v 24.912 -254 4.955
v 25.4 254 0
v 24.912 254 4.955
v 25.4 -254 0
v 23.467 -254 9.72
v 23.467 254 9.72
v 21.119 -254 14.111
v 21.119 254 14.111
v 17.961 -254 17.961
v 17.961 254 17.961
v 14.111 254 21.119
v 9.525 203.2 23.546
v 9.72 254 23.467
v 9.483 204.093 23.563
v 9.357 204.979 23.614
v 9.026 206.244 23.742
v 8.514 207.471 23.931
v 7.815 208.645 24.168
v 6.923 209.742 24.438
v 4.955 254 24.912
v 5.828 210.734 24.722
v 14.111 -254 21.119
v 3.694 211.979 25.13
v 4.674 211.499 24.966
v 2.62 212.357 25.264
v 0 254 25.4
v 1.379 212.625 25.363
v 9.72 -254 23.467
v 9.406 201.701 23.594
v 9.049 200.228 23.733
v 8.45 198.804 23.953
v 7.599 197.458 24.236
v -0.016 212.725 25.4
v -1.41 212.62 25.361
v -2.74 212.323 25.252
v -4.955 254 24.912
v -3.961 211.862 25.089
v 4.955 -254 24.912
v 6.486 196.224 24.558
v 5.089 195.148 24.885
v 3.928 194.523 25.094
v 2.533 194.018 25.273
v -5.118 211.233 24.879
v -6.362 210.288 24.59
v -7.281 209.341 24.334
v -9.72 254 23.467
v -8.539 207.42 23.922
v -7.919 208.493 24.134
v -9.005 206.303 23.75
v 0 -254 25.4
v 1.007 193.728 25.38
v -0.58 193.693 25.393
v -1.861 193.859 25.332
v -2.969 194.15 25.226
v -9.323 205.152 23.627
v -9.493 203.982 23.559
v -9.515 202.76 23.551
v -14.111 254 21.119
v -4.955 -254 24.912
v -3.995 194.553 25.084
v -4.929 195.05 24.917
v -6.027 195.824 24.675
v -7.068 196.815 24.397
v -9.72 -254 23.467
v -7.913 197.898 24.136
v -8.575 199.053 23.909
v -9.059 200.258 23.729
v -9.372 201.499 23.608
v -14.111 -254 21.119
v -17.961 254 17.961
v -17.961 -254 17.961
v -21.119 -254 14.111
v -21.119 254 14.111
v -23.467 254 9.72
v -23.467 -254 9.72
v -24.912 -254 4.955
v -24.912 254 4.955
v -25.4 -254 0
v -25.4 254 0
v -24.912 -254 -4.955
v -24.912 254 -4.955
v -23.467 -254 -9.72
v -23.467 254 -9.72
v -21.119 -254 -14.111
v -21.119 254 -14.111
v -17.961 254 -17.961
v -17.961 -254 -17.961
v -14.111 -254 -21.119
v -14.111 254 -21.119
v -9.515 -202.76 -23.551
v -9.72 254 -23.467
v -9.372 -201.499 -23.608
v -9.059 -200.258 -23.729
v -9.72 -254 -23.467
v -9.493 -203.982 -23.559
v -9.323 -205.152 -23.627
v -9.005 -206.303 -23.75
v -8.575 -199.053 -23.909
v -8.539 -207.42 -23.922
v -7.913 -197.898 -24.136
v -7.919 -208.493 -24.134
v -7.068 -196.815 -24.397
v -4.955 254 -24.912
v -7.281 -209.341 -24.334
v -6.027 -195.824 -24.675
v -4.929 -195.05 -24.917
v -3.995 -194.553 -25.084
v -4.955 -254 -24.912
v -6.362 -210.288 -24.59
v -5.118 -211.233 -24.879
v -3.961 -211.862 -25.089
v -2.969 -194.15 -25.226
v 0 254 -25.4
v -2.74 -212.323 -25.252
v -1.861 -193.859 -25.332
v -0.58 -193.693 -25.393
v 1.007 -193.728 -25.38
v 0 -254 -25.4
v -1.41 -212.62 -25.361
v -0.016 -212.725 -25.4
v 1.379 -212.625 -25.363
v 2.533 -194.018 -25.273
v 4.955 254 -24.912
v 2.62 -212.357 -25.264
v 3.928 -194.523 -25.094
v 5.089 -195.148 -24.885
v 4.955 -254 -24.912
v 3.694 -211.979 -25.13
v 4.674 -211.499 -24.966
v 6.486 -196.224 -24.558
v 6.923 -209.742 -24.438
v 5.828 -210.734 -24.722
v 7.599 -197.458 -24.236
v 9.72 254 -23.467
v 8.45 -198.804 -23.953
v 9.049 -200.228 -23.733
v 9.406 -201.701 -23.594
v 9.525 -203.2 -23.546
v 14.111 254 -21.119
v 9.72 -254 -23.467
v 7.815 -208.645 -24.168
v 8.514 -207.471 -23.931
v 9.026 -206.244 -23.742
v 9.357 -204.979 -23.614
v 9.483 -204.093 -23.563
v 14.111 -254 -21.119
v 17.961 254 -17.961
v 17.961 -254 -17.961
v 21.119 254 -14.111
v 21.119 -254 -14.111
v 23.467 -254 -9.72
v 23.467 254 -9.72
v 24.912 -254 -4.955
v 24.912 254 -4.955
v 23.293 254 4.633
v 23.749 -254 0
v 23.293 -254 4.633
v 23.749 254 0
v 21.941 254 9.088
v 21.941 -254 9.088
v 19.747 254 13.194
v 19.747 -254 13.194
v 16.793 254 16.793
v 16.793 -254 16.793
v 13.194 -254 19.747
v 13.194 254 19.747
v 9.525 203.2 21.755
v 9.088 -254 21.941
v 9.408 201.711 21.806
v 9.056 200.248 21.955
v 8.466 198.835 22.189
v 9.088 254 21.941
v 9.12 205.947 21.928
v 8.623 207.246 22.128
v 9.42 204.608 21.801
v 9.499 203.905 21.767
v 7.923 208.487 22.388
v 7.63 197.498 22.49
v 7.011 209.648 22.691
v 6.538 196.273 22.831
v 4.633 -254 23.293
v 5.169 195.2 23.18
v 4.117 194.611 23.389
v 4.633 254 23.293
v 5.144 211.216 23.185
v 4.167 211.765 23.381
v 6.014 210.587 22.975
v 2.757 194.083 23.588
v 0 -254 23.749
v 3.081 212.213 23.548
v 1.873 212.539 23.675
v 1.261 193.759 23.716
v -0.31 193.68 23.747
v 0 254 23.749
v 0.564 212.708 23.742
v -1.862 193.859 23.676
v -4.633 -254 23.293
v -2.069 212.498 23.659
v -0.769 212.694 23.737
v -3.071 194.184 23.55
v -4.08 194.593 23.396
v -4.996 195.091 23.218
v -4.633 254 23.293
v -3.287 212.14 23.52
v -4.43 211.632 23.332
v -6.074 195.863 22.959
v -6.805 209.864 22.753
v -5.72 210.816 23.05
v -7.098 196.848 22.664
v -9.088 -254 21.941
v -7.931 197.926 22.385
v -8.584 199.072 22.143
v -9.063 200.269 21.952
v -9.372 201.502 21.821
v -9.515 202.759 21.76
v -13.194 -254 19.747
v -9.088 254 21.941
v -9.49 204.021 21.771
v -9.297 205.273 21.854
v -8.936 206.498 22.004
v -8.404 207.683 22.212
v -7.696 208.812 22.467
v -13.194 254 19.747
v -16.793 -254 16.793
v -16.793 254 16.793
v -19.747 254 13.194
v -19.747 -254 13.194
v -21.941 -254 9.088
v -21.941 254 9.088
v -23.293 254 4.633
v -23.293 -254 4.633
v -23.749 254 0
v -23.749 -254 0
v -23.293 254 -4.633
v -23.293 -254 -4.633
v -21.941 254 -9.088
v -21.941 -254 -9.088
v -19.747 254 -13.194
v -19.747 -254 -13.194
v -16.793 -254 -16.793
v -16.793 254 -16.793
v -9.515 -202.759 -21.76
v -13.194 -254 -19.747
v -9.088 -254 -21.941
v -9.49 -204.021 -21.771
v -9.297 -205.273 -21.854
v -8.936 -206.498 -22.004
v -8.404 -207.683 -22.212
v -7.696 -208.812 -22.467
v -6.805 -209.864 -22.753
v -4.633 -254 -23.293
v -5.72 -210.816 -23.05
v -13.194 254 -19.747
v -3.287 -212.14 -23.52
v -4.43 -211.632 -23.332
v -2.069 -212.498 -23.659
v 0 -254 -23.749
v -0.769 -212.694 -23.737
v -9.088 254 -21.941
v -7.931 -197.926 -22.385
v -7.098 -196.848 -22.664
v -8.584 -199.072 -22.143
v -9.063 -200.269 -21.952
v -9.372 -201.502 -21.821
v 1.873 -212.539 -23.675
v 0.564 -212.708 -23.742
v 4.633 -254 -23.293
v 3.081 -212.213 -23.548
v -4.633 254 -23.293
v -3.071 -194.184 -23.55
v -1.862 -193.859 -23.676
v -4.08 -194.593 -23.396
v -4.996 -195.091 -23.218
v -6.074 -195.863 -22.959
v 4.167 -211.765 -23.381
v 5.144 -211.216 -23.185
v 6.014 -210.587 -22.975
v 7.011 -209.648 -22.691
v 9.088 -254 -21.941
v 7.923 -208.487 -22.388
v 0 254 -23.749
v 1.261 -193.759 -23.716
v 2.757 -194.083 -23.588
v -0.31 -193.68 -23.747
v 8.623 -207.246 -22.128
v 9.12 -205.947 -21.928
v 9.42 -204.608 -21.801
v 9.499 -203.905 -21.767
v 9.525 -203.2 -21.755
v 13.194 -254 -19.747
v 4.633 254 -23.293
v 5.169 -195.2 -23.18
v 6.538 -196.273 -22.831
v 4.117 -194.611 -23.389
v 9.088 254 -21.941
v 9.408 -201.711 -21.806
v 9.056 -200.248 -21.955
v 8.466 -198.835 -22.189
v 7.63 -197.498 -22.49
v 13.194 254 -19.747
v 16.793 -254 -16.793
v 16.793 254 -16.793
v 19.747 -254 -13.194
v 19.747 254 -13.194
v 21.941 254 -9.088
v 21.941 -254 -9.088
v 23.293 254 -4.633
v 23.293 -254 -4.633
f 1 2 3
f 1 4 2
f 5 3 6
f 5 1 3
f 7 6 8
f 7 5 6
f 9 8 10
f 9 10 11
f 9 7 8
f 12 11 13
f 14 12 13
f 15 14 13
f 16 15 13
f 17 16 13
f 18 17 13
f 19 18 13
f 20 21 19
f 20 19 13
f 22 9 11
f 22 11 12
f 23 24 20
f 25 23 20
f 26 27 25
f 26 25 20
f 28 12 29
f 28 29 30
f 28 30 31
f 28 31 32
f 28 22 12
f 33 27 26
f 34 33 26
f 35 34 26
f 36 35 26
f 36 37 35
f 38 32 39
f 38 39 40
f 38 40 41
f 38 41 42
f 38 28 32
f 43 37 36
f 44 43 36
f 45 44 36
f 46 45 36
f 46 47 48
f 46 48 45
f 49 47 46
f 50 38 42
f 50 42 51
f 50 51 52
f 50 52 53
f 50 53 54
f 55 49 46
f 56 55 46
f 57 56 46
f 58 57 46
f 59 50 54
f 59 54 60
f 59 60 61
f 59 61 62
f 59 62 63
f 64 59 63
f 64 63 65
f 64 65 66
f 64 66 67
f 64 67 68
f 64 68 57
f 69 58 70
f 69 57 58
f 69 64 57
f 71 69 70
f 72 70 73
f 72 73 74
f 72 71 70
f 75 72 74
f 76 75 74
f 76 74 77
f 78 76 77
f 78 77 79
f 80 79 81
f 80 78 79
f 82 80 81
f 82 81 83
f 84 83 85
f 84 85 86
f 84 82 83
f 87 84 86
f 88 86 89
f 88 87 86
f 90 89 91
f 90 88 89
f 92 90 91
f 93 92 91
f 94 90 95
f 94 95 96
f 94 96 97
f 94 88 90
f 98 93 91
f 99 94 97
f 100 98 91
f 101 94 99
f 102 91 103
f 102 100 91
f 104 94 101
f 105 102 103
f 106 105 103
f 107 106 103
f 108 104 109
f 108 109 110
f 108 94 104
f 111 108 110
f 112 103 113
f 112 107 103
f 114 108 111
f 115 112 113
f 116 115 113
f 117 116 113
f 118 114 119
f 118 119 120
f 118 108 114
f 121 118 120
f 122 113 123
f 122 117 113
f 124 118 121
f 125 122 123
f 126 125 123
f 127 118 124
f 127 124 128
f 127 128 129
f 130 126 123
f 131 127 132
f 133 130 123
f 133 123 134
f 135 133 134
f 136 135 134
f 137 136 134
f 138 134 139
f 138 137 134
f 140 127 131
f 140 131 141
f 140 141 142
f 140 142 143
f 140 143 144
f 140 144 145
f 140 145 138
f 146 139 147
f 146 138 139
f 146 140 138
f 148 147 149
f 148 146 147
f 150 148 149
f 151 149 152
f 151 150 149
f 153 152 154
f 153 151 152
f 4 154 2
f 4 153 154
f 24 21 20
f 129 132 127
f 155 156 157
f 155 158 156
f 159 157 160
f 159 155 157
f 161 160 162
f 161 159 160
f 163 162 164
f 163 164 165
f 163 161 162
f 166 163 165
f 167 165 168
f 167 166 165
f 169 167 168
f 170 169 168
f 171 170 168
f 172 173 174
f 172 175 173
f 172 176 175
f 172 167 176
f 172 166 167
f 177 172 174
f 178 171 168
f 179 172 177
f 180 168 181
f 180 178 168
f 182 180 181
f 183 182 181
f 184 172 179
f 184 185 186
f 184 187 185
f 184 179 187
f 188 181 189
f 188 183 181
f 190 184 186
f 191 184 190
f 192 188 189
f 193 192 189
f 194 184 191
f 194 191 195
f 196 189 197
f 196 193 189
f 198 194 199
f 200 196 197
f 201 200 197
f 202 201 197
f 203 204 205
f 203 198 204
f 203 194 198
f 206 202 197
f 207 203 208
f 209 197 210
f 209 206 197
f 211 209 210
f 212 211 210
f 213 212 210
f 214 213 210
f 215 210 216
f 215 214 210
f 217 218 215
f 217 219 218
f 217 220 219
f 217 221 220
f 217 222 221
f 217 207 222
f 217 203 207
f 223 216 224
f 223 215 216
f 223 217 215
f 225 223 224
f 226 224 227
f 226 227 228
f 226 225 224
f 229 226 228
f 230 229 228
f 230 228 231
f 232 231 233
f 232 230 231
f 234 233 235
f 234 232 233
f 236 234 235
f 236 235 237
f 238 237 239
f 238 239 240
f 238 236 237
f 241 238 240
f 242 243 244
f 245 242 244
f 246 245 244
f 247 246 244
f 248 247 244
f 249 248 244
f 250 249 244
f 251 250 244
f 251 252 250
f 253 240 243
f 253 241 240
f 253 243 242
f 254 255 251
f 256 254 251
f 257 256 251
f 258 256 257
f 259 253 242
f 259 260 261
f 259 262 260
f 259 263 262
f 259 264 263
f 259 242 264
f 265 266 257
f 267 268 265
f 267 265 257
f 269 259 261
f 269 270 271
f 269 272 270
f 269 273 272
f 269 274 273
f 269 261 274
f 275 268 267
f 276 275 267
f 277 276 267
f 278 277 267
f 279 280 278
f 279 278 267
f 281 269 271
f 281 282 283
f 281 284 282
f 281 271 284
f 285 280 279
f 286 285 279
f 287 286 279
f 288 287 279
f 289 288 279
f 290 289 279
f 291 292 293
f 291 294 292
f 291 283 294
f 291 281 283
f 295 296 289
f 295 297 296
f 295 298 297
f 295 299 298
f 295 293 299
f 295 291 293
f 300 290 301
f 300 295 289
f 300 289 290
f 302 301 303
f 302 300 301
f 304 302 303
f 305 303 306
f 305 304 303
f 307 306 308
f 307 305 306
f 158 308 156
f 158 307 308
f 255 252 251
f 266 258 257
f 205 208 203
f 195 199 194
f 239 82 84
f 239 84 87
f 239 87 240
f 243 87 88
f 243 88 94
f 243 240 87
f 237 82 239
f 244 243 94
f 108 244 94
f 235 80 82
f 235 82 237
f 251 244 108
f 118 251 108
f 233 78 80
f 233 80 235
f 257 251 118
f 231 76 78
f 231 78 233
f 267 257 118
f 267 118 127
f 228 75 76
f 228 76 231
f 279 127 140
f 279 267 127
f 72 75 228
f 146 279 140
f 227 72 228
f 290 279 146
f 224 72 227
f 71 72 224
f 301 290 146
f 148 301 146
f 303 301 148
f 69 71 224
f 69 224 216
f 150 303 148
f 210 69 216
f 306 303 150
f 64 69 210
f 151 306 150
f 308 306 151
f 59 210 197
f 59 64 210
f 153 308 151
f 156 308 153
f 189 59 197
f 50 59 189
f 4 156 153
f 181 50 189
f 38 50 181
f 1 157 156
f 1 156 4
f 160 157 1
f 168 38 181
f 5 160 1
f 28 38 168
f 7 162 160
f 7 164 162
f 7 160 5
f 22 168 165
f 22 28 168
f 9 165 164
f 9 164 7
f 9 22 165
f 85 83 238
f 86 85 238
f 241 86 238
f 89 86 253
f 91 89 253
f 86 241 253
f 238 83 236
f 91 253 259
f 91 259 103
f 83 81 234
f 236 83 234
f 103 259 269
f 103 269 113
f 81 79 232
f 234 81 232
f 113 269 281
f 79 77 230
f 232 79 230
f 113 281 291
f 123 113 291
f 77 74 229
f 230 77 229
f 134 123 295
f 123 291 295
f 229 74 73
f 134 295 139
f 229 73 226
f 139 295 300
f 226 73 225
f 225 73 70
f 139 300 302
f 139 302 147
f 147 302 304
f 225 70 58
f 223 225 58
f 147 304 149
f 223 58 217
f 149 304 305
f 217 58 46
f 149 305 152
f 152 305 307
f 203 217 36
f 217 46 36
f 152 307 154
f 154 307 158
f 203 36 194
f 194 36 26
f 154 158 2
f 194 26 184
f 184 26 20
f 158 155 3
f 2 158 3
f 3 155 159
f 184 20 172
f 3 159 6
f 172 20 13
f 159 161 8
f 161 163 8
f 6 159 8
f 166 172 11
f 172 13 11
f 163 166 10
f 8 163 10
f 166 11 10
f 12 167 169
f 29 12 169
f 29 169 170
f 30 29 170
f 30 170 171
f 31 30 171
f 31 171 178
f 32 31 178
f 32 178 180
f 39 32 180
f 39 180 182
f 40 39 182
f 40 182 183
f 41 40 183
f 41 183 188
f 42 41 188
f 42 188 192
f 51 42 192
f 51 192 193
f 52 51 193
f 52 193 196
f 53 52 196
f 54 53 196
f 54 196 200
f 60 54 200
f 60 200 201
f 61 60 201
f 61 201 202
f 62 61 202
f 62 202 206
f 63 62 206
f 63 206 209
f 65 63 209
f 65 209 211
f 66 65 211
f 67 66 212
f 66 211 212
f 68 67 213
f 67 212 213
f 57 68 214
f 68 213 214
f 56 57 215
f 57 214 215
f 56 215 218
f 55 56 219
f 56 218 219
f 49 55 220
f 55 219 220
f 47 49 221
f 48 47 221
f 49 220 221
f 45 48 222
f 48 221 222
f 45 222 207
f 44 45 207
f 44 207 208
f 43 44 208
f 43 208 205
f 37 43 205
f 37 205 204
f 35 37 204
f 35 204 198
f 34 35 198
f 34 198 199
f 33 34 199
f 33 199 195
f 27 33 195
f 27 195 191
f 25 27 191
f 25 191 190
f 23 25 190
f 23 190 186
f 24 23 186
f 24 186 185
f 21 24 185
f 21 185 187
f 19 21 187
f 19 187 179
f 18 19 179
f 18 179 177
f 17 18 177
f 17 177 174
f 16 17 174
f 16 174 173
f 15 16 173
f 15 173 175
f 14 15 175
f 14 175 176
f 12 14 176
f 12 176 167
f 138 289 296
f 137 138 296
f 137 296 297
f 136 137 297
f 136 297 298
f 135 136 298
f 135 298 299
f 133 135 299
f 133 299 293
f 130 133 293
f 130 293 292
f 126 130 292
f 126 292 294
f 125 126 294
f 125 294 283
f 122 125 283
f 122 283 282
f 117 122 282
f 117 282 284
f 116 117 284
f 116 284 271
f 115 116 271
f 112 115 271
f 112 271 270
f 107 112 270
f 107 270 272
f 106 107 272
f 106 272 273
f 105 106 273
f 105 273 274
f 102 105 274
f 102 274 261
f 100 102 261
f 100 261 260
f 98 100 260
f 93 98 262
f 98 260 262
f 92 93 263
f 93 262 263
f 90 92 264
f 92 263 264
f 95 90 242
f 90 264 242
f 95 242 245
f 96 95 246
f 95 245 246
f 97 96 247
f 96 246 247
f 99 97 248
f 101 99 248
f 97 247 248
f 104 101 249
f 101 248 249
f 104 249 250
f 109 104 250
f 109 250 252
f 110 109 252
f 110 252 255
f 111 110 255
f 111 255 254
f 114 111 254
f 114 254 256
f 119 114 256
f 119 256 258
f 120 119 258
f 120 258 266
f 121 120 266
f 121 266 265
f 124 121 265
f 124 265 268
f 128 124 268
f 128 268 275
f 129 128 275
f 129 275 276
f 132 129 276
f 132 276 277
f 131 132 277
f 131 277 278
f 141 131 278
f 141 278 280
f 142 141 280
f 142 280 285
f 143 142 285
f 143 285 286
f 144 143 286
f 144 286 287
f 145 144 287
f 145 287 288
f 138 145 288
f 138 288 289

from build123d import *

# Parameters (mm, degrees)
F0_R     = 25.4
F0_R_2   = 23.749
F1_DEPTH = 254
F2_DEPTH = 254
F4_D     = 19.05
F4_DEPTH = 25.401
F5_D     = 19.05
F5_DEPTH = 25.4010001


with BuildPart() as f1:
    # F0 (on Front) → F1 (new body, symmetric)
    with BuildSketch(Plane.XZ):
        Circle(F0_R)
        Circle(F0_R_2, mode=Mode.SUBTRACT)
    extrude(amount=F1_DEPTH, both=True)

    # F0 (on Front) → F2 (join, symmetric)
    with BuildSketch(Plane.XZ):
        Circle(F0_R)
        Circle(F0_R_2, mode=Mode.SUBTRACT)
    extrude(amount=F2_DEPTH, both=True)

    # F4 (through all, one way)
    with BuildSketch(Plane(origin=(0, 0, 0), x_dir=(1, 0, 0), z_dir=(0, 0, -1))):
        with Locations((0, -203.2)):
            Circle(F4_D / 2)
    extrude(amount=-F4_DEPTH, mode=Mode.SUBTRACT)

    # F5 (through all, one way)
    with BuildSketch(Plane.XY):
        with Locations((0, -203.2)):
            Circle(F5_D / 2)
    extrude(amount=-F5_DEPTH, mode=Mode.SUBTRACT)


solid = f1.part
